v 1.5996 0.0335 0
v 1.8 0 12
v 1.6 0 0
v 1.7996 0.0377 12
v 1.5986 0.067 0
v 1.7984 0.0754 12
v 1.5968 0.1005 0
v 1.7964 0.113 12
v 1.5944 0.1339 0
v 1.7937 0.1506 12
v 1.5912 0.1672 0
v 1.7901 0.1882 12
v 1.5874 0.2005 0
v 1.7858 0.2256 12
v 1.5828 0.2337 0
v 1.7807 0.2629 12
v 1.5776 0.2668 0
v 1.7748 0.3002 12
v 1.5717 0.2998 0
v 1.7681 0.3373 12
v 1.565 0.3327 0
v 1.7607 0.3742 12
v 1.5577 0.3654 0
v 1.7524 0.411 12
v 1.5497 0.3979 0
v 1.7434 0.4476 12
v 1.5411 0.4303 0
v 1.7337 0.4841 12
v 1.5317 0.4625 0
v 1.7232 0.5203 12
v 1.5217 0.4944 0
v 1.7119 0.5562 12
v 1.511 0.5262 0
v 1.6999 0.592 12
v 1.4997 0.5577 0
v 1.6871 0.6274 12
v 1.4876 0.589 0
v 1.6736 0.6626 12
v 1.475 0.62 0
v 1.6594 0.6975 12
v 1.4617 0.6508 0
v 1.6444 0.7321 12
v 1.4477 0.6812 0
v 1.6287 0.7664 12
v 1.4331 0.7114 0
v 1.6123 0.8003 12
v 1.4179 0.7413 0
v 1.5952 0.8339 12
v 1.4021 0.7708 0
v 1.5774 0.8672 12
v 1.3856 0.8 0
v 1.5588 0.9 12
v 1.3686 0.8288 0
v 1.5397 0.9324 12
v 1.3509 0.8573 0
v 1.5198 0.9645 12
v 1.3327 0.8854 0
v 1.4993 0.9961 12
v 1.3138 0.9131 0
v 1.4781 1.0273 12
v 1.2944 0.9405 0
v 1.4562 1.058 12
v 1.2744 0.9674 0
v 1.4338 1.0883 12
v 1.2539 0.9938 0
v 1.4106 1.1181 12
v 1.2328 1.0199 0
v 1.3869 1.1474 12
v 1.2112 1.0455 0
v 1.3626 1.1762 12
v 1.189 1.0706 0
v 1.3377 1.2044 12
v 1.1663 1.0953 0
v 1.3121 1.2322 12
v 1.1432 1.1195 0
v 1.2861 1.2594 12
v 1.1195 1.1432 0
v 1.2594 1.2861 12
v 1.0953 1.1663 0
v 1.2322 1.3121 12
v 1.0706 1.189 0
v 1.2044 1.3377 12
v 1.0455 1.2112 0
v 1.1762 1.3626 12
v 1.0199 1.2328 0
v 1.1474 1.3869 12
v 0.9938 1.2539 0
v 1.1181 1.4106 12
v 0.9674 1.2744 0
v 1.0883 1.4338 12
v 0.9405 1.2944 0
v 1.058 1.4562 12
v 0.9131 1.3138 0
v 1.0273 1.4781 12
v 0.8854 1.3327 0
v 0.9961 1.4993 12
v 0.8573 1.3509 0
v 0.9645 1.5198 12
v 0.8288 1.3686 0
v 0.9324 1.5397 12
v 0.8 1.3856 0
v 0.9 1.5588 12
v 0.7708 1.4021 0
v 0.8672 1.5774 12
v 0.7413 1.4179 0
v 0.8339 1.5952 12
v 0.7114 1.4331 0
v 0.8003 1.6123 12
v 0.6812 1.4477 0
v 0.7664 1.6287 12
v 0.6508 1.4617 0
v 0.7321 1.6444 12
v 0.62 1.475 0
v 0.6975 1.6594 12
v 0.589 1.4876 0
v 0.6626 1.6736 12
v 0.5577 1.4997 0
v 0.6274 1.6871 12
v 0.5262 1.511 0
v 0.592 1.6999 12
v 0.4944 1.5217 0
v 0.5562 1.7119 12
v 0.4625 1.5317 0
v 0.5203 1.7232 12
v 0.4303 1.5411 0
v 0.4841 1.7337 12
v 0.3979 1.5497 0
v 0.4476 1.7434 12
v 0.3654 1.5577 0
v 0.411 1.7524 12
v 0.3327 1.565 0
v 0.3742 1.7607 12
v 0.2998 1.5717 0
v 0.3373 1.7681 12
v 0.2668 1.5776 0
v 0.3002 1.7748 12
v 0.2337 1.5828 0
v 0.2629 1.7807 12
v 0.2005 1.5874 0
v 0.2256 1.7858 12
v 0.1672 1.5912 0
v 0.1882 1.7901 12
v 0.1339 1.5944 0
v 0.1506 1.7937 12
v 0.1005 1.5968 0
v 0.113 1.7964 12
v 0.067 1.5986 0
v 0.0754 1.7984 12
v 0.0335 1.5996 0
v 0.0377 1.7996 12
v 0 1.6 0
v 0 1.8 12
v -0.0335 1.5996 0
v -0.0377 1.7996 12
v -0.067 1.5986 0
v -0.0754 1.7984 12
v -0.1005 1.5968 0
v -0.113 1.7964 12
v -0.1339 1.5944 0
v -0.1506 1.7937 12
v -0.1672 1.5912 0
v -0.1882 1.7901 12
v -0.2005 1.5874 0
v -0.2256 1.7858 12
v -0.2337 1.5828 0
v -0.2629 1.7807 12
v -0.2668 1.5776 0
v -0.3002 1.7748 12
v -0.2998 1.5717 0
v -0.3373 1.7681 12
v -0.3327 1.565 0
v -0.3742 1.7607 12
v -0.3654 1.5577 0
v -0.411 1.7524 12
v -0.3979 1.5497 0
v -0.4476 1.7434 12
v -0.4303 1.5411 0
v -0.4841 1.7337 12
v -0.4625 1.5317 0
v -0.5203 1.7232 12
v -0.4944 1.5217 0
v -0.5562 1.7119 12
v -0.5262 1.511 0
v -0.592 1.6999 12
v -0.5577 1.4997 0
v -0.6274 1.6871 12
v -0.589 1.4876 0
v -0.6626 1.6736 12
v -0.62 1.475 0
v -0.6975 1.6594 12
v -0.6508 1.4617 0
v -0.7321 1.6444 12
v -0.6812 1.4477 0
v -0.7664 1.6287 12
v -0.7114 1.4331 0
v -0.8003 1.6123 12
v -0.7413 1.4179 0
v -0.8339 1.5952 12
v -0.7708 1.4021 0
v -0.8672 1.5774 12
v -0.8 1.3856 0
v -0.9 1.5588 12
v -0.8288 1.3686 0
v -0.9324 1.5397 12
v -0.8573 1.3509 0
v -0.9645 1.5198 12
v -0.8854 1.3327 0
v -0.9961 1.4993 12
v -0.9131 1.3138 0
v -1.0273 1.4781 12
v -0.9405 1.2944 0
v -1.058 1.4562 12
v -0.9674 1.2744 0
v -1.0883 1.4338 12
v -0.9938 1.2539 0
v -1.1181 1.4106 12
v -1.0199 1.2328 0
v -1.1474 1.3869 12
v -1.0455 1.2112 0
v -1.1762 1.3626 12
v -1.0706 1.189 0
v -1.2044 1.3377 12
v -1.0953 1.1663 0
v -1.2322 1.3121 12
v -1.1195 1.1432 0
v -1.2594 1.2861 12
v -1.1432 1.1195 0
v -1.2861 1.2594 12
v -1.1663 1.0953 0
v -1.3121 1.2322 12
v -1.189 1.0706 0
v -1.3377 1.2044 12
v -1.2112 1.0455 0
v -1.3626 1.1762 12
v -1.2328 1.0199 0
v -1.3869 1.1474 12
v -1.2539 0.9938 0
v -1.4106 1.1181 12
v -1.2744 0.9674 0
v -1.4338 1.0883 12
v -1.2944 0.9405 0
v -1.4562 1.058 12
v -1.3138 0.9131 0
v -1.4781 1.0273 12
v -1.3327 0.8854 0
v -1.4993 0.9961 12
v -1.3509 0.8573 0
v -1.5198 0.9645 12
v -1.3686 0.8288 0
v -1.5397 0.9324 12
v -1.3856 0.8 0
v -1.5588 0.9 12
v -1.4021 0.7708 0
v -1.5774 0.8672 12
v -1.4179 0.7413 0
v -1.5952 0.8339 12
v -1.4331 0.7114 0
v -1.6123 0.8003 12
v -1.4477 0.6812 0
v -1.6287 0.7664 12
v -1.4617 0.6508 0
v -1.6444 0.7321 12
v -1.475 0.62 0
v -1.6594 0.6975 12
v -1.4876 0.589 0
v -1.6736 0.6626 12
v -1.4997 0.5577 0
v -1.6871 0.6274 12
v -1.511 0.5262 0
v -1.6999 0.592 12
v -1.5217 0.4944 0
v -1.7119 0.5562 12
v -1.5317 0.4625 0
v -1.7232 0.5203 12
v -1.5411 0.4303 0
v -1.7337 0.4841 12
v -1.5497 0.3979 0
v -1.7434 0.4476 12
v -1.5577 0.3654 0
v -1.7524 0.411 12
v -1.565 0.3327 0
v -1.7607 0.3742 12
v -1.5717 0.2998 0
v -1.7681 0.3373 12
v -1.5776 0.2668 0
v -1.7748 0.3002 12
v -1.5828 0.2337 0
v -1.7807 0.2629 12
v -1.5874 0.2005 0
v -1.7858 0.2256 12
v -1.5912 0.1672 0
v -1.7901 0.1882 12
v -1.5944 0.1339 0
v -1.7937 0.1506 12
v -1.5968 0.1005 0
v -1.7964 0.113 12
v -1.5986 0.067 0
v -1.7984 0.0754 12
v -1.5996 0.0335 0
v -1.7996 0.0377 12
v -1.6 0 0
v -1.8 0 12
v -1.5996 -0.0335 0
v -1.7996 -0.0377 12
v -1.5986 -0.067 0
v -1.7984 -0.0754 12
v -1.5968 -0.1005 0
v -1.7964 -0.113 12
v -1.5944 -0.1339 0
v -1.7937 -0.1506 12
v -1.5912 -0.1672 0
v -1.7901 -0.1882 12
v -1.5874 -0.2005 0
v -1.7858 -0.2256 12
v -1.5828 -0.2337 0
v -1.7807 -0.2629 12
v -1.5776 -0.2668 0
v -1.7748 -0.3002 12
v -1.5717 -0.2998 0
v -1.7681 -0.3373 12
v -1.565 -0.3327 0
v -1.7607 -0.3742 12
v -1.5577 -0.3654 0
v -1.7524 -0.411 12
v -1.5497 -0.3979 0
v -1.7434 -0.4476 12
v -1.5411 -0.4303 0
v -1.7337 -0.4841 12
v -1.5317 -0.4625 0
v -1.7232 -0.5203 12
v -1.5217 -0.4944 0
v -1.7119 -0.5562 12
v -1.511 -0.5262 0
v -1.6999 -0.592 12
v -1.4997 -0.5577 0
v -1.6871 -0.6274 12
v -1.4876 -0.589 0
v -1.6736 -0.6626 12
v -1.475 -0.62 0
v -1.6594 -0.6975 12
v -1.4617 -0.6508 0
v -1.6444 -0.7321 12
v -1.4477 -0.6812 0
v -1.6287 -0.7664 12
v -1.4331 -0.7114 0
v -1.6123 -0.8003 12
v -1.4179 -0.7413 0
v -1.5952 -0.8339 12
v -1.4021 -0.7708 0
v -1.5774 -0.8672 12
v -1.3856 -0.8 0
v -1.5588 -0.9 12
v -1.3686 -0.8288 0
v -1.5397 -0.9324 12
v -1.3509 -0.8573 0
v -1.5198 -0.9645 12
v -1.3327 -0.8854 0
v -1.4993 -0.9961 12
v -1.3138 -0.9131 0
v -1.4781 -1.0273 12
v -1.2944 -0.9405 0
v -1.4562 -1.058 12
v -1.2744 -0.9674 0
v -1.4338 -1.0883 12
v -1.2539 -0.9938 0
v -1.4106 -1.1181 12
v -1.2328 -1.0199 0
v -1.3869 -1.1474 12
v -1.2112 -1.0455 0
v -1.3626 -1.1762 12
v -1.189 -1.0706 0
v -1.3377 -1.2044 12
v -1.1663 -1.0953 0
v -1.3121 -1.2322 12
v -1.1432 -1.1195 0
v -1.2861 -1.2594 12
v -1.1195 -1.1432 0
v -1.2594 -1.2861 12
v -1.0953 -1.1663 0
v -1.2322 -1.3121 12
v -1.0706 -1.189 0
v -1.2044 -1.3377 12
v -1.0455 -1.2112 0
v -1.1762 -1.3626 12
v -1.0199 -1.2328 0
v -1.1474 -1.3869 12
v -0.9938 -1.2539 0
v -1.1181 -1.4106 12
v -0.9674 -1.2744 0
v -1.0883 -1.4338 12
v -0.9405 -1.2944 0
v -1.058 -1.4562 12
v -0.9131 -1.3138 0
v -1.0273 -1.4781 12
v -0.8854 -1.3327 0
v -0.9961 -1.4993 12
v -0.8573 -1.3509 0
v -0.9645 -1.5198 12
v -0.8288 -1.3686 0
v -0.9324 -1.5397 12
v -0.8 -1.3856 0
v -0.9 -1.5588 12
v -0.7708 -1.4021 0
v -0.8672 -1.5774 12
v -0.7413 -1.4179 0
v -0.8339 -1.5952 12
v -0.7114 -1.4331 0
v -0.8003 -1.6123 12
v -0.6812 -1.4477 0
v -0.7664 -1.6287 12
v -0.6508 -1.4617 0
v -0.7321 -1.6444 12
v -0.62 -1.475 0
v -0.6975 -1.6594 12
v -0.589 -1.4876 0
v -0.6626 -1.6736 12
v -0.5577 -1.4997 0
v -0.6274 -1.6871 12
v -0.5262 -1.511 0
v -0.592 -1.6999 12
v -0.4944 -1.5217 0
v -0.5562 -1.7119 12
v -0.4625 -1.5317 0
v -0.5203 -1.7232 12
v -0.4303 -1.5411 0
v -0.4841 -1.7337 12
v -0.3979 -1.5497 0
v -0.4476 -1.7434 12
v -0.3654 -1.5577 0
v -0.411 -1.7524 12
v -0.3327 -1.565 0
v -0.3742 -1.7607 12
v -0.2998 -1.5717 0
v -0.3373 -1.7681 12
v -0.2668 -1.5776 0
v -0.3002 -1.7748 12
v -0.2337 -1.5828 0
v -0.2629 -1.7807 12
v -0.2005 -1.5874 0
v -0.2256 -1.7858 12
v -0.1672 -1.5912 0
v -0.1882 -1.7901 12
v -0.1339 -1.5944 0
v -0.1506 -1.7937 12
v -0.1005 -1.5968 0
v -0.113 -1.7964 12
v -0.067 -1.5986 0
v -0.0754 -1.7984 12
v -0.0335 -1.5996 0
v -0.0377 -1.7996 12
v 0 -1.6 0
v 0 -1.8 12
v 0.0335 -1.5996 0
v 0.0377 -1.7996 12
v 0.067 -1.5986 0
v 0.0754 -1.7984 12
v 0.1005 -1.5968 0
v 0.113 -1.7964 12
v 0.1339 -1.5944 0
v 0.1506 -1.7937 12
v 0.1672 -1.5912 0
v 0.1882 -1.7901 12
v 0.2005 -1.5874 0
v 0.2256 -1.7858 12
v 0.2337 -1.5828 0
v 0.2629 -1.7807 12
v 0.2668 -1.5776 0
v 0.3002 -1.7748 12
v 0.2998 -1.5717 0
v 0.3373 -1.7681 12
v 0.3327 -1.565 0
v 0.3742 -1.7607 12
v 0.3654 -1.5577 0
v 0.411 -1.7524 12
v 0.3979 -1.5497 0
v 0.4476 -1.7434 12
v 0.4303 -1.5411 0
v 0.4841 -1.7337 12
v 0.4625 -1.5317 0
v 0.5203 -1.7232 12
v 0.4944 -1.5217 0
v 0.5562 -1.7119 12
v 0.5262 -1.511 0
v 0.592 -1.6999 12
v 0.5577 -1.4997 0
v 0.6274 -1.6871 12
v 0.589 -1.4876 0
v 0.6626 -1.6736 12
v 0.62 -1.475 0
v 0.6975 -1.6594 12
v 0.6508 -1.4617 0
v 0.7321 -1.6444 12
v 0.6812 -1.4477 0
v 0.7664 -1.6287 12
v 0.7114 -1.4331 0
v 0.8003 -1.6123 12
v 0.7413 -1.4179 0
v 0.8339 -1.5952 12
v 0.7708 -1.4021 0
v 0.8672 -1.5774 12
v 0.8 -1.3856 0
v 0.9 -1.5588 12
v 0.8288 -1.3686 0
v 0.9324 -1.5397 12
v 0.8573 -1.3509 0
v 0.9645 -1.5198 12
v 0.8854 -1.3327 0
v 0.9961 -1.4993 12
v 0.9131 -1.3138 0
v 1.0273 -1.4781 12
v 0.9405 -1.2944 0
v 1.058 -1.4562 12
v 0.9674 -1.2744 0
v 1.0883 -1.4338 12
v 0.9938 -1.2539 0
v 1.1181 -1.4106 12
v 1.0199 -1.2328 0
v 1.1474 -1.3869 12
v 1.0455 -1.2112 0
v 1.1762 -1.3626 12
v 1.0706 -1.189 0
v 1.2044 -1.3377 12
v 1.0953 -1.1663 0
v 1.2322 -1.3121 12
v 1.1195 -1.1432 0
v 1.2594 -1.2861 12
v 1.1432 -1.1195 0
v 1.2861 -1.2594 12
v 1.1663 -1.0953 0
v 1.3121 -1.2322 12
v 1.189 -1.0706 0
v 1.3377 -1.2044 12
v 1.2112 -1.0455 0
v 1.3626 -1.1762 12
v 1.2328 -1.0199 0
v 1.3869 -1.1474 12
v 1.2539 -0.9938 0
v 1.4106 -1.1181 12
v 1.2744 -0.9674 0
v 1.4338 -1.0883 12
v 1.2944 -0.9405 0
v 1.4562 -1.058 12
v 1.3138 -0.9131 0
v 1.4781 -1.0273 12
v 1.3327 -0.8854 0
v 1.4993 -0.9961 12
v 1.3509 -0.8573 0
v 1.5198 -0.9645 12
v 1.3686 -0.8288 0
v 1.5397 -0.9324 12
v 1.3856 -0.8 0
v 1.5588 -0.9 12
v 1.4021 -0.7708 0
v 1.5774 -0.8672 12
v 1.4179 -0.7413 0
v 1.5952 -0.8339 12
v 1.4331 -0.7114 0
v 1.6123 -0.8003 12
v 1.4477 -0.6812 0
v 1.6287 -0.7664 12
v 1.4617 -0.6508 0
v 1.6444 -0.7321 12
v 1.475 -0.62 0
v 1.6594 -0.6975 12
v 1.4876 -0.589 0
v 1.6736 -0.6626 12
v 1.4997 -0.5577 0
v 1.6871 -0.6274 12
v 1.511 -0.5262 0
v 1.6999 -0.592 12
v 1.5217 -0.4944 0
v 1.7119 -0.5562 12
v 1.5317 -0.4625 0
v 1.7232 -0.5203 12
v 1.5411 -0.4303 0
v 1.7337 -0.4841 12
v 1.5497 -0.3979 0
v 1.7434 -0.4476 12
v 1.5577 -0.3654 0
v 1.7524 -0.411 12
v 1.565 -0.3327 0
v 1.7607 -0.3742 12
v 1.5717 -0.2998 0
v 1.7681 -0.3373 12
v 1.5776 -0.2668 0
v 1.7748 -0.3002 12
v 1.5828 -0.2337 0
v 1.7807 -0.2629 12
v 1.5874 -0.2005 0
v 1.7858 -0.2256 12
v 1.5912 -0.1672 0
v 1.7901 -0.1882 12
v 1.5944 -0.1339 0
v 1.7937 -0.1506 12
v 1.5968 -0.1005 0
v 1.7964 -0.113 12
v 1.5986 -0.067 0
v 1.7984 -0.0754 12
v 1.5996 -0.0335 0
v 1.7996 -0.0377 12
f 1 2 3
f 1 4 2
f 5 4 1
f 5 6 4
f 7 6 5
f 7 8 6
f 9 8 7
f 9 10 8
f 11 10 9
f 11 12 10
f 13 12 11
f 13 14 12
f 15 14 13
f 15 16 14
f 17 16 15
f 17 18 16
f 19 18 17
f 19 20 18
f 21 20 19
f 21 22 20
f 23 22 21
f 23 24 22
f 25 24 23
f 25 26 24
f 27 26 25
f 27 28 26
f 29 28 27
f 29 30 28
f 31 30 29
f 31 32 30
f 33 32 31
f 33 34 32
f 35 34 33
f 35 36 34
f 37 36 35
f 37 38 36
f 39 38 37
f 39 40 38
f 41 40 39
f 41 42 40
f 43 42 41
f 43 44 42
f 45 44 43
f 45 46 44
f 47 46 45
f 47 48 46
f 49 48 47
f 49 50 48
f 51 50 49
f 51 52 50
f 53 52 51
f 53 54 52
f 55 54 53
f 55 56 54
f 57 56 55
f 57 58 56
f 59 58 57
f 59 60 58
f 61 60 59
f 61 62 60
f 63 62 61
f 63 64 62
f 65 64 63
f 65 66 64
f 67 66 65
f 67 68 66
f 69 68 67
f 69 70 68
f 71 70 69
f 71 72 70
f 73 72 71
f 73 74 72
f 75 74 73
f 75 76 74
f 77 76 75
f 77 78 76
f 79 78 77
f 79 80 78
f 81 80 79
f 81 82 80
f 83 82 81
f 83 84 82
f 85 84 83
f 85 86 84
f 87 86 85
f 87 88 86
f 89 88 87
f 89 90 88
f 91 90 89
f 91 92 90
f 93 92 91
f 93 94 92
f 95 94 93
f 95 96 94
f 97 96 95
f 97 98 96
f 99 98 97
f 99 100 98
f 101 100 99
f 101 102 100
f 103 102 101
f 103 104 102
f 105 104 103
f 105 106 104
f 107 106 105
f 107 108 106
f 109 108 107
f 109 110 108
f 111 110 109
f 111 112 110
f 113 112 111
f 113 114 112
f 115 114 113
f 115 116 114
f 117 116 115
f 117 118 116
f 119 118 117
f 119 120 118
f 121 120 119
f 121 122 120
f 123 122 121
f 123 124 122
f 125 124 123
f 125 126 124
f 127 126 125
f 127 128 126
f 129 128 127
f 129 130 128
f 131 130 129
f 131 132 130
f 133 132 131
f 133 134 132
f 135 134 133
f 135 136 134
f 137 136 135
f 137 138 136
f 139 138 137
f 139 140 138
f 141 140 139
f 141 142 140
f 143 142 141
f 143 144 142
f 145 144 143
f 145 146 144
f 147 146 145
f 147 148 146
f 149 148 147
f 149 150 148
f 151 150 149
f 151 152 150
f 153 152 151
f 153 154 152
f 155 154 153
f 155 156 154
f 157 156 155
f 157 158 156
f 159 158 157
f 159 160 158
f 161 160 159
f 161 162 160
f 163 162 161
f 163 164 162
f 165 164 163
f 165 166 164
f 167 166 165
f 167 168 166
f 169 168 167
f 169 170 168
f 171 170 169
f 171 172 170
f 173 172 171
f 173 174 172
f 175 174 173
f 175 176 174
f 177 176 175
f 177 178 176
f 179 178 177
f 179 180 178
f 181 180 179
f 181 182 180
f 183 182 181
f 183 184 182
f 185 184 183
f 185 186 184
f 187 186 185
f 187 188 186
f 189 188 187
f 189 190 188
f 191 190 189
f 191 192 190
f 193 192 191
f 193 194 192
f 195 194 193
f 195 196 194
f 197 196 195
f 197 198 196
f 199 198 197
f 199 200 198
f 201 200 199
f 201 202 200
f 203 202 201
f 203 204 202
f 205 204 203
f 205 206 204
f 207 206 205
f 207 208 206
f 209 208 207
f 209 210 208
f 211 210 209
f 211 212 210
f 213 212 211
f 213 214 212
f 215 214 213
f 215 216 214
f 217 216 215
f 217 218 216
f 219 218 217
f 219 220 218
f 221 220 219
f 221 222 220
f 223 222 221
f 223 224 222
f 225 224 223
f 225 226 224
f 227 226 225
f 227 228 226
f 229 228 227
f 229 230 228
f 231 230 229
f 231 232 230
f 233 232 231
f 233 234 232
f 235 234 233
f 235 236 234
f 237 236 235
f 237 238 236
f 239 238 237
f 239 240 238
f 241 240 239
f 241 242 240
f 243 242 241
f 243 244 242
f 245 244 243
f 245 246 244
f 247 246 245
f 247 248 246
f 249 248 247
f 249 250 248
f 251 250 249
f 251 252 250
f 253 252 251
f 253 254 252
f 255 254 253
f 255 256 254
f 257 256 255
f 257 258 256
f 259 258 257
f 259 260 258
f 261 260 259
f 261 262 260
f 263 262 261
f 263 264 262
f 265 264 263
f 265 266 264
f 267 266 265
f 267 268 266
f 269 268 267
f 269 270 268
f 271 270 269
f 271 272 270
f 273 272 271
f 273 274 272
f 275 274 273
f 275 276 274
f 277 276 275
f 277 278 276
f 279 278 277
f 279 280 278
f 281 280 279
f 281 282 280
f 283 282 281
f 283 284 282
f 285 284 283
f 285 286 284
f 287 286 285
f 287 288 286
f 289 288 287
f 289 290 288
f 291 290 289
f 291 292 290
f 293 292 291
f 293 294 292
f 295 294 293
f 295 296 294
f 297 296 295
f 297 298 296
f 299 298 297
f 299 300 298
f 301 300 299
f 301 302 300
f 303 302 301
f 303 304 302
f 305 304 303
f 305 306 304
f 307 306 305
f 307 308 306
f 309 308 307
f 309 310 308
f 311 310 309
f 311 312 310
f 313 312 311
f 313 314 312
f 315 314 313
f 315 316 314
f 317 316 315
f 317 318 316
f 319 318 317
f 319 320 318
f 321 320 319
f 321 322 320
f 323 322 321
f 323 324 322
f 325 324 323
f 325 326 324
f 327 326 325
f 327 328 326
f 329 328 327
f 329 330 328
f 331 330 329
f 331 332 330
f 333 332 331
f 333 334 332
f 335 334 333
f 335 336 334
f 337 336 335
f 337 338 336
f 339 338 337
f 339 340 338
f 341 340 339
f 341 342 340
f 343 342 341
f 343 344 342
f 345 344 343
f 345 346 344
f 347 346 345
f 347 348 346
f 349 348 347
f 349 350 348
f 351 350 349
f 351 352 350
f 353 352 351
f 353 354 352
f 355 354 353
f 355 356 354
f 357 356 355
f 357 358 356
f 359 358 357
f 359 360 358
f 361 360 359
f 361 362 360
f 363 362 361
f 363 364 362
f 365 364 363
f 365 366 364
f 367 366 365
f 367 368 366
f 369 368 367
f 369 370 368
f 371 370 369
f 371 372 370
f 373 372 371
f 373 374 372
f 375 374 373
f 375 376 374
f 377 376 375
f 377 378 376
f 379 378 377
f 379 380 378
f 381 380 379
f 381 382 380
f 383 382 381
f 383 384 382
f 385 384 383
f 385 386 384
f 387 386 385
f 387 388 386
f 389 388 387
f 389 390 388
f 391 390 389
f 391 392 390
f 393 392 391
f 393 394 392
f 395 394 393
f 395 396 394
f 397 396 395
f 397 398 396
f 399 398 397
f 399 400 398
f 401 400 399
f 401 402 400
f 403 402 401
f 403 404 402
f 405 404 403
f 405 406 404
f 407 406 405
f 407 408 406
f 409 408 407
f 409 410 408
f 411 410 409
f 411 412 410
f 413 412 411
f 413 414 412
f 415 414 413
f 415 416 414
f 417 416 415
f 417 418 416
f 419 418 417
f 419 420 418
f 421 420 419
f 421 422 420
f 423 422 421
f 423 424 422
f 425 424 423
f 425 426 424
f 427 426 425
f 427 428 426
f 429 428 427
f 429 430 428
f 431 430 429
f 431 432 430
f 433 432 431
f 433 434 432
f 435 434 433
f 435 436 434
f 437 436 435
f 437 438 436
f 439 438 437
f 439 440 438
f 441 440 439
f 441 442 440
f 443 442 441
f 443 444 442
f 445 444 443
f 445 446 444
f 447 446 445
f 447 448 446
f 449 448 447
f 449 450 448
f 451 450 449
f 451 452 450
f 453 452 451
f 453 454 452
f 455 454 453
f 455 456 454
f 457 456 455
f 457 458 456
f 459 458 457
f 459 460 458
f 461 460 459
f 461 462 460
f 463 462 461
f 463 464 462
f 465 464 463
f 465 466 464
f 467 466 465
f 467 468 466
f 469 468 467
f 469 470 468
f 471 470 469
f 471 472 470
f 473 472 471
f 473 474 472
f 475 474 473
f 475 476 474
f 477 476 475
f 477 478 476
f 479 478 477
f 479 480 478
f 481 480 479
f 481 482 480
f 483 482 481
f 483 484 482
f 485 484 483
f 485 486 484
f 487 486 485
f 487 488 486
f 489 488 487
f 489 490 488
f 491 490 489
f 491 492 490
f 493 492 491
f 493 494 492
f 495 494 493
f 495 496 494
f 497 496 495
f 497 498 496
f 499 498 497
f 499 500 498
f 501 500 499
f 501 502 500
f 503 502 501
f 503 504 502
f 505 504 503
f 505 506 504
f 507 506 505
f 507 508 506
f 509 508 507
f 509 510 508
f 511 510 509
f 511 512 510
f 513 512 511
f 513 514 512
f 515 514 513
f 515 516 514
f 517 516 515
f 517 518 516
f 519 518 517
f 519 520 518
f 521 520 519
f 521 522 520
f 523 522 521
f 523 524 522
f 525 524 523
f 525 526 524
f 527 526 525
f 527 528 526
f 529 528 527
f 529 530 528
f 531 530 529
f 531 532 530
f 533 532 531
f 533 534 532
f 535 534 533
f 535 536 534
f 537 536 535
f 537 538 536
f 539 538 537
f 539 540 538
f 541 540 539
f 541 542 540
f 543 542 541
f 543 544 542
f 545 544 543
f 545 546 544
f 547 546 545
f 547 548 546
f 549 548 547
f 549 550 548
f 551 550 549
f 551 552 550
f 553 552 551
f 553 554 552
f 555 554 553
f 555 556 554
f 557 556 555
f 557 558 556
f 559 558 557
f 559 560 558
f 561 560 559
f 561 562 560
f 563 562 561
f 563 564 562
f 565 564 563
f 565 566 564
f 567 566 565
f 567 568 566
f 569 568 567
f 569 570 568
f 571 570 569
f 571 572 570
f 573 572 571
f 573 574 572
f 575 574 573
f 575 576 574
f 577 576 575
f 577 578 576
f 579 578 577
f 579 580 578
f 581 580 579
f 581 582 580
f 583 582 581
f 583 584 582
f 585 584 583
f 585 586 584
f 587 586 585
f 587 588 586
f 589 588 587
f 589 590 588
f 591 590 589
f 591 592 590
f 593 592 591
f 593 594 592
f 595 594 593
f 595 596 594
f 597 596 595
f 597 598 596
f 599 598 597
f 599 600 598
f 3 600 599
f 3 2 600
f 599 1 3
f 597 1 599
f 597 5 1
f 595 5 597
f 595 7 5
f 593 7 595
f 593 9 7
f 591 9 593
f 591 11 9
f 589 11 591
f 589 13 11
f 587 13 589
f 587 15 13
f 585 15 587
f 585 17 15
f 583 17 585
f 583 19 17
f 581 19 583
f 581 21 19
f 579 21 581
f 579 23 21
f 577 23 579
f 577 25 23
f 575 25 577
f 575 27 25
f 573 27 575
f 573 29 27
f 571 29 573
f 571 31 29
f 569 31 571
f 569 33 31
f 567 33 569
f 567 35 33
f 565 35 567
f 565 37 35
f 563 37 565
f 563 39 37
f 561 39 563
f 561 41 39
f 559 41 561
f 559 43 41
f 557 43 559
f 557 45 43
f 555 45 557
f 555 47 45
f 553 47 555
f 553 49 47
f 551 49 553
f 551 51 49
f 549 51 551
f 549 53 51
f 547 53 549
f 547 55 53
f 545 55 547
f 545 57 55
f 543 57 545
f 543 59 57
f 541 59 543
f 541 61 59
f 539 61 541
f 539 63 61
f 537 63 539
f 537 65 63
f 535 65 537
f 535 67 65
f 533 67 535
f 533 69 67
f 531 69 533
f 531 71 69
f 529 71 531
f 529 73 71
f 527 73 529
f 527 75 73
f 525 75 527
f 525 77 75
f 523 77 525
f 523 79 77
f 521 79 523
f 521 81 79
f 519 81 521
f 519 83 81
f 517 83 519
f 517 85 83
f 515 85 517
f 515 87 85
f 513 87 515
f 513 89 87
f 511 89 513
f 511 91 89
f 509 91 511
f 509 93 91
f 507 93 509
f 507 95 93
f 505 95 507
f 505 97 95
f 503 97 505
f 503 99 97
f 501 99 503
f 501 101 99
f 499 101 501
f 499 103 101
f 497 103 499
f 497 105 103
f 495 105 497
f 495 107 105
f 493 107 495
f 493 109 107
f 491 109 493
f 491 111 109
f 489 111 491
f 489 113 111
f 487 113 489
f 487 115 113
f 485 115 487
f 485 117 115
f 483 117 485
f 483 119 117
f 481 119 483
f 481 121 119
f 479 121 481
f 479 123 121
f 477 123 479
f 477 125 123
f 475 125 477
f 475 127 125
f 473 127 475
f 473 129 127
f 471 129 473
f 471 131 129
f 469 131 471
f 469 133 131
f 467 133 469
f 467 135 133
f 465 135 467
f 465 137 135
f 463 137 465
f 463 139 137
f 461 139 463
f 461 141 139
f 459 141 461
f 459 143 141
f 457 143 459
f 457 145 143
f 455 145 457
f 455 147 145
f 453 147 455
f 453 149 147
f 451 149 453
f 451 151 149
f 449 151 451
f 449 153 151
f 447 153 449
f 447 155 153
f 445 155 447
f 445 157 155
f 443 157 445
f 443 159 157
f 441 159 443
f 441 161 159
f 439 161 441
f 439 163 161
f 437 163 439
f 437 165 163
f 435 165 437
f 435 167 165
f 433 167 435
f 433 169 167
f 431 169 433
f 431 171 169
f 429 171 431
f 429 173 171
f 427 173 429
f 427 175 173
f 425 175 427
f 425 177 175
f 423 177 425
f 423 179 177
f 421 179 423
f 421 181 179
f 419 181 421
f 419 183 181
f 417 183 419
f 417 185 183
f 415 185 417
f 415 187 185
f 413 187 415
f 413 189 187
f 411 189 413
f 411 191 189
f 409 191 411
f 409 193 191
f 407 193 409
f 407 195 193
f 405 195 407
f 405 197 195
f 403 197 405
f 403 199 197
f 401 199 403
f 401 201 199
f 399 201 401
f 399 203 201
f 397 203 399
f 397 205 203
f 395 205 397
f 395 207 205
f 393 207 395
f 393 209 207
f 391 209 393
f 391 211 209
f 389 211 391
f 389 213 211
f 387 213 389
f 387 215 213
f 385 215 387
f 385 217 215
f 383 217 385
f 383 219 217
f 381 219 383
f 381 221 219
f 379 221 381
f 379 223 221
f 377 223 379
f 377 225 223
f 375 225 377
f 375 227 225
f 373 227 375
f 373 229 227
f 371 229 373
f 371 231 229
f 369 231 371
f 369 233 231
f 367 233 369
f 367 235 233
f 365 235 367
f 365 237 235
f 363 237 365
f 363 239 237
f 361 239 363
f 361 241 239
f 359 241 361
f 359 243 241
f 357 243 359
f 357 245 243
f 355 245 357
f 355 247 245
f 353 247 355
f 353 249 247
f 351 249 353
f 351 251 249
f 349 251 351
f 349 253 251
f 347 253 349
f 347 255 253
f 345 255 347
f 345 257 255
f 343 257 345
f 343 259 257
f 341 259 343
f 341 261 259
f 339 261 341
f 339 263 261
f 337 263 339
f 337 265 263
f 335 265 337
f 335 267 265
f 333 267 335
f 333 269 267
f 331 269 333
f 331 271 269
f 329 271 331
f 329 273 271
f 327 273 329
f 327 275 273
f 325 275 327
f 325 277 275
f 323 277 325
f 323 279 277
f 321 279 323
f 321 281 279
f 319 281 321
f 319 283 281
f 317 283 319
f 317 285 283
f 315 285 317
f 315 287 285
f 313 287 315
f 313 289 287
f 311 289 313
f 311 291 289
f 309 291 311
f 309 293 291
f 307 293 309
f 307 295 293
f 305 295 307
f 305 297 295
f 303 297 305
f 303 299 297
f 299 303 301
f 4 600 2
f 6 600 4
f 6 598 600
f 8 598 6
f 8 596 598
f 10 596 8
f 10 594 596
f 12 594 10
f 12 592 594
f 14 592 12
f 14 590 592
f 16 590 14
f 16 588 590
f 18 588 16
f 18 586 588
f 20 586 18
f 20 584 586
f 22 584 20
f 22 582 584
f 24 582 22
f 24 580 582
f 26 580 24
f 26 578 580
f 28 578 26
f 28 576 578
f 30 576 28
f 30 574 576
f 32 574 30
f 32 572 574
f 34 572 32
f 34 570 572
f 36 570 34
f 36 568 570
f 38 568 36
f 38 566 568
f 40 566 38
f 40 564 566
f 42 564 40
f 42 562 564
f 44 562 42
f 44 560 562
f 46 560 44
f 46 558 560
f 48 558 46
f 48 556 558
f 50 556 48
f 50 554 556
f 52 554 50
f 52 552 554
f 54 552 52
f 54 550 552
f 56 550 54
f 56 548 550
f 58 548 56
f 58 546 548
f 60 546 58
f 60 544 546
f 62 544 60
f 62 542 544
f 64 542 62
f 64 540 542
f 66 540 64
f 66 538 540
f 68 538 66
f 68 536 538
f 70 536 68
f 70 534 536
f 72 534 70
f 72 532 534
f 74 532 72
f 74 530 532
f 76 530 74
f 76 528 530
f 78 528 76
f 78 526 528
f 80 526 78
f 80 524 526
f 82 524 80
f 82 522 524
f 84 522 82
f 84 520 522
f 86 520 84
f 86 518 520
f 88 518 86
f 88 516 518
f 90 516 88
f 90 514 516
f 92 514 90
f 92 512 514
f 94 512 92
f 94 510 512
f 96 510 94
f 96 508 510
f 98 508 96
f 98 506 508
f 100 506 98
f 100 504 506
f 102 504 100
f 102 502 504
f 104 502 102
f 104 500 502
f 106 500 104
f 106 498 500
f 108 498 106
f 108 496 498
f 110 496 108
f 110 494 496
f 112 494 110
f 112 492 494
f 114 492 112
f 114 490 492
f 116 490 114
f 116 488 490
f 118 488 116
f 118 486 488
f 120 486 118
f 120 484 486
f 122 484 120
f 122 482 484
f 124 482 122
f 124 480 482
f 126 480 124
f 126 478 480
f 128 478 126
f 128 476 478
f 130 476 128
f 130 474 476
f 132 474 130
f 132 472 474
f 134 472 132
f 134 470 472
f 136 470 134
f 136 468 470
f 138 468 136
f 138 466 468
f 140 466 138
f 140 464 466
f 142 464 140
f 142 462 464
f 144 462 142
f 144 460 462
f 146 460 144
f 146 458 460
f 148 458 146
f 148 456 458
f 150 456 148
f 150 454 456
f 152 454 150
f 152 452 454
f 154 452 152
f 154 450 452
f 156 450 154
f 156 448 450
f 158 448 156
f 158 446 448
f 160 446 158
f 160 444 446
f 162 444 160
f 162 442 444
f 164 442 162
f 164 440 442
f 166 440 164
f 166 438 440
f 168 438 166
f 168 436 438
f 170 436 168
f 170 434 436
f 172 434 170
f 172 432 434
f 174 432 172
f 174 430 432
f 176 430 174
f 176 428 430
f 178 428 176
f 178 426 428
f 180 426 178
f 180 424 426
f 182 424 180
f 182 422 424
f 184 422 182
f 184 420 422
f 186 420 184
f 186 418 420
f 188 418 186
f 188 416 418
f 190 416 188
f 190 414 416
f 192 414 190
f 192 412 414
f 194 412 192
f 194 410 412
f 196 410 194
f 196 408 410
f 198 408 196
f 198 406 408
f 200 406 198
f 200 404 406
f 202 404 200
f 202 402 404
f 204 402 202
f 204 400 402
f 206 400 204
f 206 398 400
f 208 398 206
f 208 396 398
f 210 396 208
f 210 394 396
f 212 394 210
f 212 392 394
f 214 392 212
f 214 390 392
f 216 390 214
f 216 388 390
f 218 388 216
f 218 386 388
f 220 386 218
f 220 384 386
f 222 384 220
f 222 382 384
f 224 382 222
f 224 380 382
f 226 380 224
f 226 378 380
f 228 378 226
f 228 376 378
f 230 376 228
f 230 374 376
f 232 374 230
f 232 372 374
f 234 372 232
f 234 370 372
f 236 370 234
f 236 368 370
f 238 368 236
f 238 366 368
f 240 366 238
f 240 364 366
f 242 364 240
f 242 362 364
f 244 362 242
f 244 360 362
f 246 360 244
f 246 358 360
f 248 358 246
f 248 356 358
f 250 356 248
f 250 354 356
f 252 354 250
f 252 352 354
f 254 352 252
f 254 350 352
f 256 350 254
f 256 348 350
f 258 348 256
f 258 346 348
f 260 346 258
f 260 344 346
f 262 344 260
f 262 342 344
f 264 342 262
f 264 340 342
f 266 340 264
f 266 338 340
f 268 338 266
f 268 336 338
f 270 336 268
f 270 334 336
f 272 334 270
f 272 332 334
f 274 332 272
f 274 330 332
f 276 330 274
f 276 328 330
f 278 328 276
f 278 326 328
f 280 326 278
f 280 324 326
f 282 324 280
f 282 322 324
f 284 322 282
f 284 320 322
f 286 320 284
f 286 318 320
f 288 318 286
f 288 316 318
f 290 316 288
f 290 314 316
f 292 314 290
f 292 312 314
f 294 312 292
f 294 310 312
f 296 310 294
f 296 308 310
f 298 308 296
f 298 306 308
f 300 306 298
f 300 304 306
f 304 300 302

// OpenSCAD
// file: Peg.scad
// Puzzlebox Bloom
//
// component: Peg (Replacement Screw and Mounting Pin)
//
// designed by Puzzlebox Productions, LLC
// http://puzzlebox.io/bloom
//
// Copyright Puzzlebox Productions, LLC (2014-2015)
//
// License: Creative Commons - Attribution - Share Alike
//          https://creativecommons.org/licenses/by-sa/3.0


module assemble_peg(){
	
	build_peg();
	
}


module build_peg(){
	
	color([0.4,0.4,0.4])
	translate([0,0,peg_length/2])
		cylinder(h=peg_length, d2=peg_diameter-tol, d1=peg_diameter-(tol*2), center=true);
	
	
}
// main file
// Puzzlebox Bloom
//
// component: Peg
//
// edition: Render
//
// by Puzzlebox Productions, LLC
// http://puzzlebox.io/bloom
//
// License: Creative Commons - Attribution - Share Alike
//          https://creativecommons.org/licenses/by-sa/3.0


// Libraries
include <../Configuration.scad>
include <../peg/Peg.scad>


// Rendering quality (calculated via angle in degrees)
$fa=3;
$fn=300;


print_scale = 1.0; // overrides default from Configuration

// Main
scale([print_scale, print_scale, print_scale])
assemble_peg();
